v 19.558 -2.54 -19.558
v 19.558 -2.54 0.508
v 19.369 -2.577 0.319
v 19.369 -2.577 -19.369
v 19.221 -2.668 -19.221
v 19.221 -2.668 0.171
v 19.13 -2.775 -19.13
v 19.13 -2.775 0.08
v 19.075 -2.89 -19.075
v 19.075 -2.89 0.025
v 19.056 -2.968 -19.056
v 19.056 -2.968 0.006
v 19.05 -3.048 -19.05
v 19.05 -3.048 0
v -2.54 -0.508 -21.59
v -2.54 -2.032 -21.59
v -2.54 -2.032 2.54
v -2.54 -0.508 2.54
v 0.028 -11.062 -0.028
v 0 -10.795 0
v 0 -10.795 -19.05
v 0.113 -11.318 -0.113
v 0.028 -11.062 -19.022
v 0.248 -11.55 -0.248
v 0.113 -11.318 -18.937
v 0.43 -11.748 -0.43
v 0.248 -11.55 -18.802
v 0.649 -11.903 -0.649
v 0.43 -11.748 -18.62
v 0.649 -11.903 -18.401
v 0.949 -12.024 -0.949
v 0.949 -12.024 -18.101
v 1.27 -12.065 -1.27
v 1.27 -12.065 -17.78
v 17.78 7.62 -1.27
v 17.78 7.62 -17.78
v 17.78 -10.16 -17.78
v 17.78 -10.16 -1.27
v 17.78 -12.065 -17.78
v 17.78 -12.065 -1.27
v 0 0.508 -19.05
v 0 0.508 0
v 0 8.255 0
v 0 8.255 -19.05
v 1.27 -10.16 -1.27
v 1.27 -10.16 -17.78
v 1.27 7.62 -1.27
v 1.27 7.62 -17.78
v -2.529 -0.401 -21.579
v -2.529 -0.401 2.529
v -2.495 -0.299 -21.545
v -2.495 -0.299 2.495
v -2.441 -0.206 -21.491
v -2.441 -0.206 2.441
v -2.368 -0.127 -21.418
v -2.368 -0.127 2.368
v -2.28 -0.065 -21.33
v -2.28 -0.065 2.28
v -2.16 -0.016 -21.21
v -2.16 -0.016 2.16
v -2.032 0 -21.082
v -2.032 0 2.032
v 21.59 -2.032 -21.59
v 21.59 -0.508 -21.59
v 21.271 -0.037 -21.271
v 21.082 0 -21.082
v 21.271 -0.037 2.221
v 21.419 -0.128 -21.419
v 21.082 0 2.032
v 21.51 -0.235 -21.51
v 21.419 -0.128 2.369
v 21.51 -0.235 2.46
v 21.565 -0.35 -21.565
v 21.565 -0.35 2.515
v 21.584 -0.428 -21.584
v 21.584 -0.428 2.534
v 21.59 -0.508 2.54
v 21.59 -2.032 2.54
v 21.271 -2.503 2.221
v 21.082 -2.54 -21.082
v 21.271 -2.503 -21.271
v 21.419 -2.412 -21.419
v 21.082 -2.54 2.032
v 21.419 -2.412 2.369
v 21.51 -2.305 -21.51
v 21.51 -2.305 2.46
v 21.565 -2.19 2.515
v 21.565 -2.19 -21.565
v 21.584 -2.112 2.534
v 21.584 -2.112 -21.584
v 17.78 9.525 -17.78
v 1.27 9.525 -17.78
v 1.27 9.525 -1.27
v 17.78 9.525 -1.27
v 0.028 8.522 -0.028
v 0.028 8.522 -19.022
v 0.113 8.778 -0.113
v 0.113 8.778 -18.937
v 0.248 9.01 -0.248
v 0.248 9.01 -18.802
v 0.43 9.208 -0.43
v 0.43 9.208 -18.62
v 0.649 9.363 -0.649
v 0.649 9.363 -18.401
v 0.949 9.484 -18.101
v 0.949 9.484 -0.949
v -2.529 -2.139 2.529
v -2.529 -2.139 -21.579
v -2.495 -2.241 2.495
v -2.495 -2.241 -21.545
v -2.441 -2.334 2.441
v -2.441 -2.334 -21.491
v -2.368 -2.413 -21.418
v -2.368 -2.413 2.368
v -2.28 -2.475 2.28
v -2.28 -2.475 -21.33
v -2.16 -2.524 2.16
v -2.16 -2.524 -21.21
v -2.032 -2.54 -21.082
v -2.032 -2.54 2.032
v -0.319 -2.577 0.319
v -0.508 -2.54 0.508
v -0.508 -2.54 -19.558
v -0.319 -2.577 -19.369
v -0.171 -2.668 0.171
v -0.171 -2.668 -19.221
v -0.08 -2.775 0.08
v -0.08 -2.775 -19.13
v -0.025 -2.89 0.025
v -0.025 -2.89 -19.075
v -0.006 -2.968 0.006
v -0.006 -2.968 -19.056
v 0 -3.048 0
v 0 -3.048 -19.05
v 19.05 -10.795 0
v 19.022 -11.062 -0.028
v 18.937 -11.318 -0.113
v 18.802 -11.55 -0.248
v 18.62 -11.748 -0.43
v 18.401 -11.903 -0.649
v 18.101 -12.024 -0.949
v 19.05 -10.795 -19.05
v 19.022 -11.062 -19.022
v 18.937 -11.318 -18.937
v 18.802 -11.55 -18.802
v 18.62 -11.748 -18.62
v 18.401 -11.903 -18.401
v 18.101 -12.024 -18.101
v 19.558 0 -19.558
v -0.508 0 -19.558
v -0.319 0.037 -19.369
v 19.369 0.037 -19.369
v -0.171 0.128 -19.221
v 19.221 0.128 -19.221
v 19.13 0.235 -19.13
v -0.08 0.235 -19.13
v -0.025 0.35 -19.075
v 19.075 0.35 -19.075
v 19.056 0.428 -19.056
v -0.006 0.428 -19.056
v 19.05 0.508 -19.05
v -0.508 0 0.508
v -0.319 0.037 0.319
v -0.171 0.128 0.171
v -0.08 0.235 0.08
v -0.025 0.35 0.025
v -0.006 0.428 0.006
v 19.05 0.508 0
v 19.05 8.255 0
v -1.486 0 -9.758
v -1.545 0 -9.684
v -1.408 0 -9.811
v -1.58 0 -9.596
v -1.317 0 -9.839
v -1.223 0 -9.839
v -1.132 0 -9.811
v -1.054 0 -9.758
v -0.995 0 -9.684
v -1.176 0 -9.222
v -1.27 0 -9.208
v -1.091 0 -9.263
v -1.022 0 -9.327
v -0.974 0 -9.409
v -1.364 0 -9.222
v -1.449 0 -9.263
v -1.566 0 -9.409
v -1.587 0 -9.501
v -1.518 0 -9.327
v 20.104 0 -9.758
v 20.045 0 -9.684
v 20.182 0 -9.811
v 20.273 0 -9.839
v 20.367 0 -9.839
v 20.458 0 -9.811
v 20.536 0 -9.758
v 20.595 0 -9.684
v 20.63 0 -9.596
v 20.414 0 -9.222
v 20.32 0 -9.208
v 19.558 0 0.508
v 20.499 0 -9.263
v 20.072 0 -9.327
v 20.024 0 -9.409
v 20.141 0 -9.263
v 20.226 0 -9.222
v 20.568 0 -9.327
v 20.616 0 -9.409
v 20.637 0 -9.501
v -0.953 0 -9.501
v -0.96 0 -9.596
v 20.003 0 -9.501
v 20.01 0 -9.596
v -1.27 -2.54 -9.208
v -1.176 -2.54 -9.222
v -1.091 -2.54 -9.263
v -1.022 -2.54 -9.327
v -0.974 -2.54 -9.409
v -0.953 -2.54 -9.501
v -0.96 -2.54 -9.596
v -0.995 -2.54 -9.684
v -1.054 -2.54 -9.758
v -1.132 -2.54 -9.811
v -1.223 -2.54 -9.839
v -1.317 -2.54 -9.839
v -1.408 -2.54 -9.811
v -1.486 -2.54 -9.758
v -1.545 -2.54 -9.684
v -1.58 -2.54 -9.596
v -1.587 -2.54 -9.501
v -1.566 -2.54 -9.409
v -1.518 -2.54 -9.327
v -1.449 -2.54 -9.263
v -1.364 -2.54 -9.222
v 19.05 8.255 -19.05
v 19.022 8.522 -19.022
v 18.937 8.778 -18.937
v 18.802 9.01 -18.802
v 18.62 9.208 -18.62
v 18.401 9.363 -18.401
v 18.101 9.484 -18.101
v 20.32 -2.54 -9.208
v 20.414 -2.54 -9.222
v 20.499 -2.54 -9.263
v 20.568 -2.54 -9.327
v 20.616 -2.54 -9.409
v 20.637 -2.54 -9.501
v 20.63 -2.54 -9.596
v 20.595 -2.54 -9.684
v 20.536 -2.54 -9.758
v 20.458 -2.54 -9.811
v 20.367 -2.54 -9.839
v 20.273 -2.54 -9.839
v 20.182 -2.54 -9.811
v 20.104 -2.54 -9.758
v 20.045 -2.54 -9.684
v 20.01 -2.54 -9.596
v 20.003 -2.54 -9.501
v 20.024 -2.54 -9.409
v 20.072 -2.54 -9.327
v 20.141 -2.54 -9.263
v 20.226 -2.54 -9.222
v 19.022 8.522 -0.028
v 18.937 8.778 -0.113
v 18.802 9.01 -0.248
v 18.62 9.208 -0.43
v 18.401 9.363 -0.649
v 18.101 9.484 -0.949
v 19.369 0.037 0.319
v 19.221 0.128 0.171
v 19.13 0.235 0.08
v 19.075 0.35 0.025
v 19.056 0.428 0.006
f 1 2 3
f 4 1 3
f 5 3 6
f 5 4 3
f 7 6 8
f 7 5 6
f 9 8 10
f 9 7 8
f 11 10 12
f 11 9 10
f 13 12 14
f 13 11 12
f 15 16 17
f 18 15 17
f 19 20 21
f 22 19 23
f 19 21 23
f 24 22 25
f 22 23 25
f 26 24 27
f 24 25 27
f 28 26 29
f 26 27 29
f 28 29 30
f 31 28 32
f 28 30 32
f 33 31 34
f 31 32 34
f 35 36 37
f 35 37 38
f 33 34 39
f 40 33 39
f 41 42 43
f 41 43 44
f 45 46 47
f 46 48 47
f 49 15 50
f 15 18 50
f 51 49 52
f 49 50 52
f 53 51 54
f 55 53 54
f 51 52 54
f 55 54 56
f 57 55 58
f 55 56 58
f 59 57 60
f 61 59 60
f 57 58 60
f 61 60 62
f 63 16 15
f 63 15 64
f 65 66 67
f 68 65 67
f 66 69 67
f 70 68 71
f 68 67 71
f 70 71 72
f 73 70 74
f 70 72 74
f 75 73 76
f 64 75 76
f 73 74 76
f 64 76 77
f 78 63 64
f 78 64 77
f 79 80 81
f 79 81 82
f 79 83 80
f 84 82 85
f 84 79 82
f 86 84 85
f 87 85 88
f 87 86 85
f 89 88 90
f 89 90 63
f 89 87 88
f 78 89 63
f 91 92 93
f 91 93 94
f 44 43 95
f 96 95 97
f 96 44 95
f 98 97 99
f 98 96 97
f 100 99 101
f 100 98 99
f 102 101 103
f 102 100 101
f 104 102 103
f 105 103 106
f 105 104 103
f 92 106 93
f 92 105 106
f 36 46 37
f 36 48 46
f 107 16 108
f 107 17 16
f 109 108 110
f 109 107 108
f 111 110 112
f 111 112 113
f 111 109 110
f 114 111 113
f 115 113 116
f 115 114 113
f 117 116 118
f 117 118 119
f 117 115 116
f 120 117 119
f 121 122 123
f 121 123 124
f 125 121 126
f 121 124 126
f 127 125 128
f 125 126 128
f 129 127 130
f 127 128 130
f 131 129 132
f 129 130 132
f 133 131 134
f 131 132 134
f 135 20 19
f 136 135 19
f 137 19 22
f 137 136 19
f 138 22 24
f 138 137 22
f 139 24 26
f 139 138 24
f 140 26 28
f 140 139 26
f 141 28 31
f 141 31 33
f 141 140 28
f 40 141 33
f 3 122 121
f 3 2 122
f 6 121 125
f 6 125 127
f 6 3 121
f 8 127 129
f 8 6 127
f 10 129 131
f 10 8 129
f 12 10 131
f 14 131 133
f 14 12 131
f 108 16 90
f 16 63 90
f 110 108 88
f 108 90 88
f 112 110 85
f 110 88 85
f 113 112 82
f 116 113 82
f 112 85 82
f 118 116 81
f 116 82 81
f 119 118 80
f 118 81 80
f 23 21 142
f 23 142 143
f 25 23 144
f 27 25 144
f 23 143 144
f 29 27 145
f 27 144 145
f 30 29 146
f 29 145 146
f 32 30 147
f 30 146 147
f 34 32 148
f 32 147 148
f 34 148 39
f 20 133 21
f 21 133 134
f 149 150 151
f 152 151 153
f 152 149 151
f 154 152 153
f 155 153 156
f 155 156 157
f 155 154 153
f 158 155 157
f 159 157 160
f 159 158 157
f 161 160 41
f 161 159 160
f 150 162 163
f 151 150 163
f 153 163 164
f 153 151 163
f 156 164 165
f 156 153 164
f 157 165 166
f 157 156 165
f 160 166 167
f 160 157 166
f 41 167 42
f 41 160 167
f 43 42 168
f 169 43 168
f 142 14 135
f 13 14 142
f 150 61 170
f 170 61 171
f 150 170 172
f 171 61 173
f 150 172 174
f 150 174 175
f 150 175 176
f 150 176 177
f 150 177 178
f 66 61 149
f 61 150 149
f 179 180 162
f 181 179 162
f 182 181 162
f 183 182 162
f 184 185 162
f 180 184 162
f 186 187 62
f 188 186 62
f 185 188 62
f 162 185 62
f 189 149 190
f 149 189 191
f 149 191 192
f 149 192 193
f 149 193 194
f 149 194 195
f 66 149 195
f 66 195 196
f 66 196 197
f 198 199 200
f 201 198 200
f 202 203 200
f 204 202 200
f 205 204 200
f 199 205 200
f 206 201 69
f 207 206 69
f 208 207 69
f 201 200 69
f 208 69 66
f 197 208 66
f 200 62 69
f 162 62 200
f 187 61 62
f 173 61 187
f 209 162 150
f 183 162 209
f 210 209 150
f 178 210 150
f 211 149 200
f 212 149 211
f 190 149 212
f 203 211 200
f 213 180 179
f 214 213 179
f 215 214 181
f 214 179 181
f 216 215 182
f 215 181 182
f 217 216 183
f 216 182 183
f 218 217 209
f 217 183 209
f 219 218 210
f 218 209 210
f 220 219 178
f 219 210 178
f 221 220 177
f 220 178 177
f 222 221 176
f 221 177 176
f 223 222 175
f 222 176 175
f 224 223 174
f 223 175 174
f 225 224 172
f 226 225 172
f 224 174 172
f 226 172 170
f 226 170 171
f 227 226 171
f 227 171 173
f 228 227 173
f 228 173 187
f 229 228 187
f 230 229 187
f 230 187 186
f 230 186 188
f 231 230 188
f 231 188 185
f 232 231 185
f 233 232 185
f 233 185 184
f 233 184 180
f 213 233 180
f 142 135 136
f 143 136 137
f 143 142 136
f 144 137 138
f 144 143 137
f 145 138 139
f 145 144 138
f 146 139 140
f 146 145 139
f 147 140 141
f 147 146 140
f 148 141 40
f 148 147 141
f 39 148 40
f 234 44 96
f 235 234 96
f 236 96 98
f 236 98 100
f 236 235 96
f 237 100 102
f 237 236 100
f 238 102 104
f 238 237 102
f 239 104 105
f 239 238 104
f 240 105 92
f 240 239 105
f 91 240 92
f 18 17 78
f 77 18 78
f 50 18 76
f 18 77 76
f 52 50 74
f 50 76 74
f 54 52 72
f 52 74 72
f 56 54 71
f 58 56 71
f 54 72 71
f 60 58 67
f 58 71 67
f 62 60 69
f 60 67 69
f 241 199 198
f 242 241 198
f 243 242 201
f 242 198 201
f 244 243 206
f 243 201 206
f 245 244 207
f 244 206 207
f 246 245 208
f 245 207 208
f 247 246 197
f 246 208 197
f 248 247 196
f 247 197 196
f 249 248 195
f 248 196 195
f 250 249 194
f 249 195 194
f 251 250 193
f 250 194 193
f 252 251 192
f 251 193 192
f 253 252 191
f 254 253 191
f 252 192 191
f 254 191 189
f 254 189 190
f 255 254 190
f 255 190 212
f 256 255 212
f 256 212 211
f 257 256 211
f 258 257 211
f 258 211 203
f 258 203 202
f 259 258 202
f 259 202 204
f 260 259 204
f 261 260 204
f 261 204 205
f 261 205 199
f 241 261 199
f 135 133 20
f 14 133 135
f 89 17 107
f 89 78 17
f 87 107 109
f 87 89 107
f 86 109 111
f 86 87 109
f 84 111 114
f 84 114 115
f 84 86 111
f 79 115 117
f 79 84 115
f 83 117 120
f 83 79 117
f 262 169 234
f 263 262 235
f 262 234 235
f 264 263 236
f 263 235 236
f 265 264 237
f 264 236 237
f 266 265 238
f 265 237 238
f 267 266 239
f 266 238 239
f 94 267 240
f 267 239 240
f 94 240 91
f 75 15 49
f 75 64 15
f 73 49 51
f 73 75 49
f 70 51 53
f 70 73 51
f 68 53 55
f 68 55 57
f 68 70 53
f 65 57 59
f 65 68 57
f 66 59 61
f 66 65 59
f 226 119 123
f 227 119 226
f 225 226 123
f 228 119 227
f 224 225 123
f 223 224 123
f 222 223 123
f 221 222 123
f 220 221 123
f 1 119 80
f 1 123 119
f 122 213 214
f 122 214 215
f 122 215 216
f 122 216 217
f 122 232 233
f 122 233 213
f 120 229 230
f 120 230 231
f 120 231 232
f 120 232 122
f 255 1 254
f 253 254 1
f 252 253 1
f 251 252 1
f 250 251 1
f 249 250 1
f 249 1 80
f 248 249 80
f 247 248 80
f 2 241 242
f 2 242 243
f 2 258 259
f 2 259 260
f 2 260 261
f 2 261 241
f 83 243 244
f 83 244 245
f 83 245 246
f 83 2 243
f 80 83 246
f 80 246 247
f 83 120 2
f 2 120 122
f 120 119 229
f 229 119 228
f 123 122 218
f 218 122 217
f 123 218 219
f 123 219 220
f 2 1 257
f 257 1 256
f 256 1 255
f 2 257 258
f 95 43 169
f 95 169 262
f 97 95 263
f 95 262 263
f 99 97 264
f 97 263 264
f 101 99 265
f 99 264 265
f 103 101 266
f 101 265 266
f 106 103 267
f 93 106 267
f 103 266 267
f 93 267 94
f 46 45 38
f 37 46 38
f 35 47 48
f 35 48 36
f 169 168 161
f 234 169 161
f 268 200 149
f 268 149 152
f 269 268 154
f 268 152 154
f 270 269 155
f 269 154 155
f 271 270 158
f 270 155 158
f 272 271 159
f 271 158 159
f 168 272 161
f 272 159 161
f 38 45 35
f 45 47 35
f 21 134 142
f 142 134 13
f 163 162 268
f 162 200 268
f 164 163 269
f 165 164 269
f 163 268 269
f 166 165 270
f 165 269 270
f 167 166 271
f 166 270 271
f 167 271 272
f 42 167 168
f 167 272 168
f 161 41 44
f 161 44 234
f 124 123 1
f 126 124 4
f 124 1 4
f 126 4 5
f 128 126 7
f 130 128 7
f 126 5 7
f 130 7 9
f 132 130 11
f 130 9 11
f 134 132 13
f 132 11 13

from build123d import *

# Parameters (mm, degrees)
SKETCH1_W           = 19.05
SKETCH1_H           = 19.05
BOSS_EXTRUDE1_DEPTH = 9.525
FILLET1_R           = 1.27
SKETCH2_W           = 24.13
SKETCH2_H           = 24.13
BOSS_EXTRUDE2_DEPTH = 1.27
FILLET2_R           = 0.508
SKETCH3_W           = 16.51
SKETCH3_H           = 16.51
CUT_EXTRUDE2_DEPTH  = 8.89
SKETCH4_R           = 0.3175
CUT_EXTRUDE3_DEPTH  = 33.830175525


with BuildPart() as part:
    # Sketch1 → Boss-Extrude1 (new body)
    with BuildSketch(Plane(origin=(0, 0, 0), x_dir=(1, 0, 0), z_dir=(0, 1, 0))):
        with Locations((9.525, 9.525)):
            Rectangle(SKETCH1_W, SKETCH1_H)
    extrude(amount=BOSS_EXTRUDE1_DEPTH)

    # Fillet1
    fillet1_edges = [part.edges().sort_by_distance(p)[0] for p in [
        (19.05, 9.525, -9.525),
        (9.525, 9.525, -19.05),
        (0, 9.525, -9.525),
        (9.525, 9.525, 0),
    ]]
    fillet(fillet1_edges, radius=FILLET1_R)

    # Sketch2 → Boss-Extrude2 (add)
    with BuildSketch(Plane.XZ):
        with Locations((9.525, -9.525)):
            Rectangle(SKETCH2_W, SKETCH2_H)
    extrude(amount=BOSS_EXTRUDE2_DEPTH)

    # Fillet2
    fillet2_edges = [part.edges().sort_by_distance(p)[0] for p in [
        (21.59, 0, -9.525),
        (9.525, 0, 2.54),
        (-2.54, 0, -9.525),
        (9.525, 0, -21.59),
        (9.525, 0, -19.05),
        (19.05, 0, -9.525),
        (9.525, 0, 0),
        (0, 0, -9.525),
    ]]
    fillet(fillet2_edges, radius=FILLET2_R)

    # Sketch3 → Cut-Extrude2 (cut)
    with BuildSketch(Plane.XZ.offset(1.27)):
        with Locations((9.525, -9.525)):
            Rectangle(SKETCH3_W, SKETCH3_H)
    extrude(amount=-CUT_EXTRUDE2_DEPTH, mode=Mode.SUBTRACT)

    # Mirror3: part across plane


with BuildPart() as part_1:
    add(part.part)
    add(part.part.mirror(Plane(origin=(0, -1.27, 0), x_dir=(0, 0, 1), z_dir=(0, -1, 0))))

    # Sketch4 → Cut-Extrude3 (cut, through all)
    with BuildSketch(Plane(origin=(0, 0, 0), x_dir=(1, 0, 0), z_dir=(0, 1, 0))):
        with Locations(Location((20.32, 9.525, 0), (0, 0, 270))):
            Circle(SKETCH4_R)
        with Locations(Location((-1.27, 9.525, 0), (0, 0, 270))):
            Circle(SKETCH4_R)
    extrude(amount=-CUT_EXTRUDE3_DEPTH, mode=Mode.SUBTRACT)


solid = part_1.part
